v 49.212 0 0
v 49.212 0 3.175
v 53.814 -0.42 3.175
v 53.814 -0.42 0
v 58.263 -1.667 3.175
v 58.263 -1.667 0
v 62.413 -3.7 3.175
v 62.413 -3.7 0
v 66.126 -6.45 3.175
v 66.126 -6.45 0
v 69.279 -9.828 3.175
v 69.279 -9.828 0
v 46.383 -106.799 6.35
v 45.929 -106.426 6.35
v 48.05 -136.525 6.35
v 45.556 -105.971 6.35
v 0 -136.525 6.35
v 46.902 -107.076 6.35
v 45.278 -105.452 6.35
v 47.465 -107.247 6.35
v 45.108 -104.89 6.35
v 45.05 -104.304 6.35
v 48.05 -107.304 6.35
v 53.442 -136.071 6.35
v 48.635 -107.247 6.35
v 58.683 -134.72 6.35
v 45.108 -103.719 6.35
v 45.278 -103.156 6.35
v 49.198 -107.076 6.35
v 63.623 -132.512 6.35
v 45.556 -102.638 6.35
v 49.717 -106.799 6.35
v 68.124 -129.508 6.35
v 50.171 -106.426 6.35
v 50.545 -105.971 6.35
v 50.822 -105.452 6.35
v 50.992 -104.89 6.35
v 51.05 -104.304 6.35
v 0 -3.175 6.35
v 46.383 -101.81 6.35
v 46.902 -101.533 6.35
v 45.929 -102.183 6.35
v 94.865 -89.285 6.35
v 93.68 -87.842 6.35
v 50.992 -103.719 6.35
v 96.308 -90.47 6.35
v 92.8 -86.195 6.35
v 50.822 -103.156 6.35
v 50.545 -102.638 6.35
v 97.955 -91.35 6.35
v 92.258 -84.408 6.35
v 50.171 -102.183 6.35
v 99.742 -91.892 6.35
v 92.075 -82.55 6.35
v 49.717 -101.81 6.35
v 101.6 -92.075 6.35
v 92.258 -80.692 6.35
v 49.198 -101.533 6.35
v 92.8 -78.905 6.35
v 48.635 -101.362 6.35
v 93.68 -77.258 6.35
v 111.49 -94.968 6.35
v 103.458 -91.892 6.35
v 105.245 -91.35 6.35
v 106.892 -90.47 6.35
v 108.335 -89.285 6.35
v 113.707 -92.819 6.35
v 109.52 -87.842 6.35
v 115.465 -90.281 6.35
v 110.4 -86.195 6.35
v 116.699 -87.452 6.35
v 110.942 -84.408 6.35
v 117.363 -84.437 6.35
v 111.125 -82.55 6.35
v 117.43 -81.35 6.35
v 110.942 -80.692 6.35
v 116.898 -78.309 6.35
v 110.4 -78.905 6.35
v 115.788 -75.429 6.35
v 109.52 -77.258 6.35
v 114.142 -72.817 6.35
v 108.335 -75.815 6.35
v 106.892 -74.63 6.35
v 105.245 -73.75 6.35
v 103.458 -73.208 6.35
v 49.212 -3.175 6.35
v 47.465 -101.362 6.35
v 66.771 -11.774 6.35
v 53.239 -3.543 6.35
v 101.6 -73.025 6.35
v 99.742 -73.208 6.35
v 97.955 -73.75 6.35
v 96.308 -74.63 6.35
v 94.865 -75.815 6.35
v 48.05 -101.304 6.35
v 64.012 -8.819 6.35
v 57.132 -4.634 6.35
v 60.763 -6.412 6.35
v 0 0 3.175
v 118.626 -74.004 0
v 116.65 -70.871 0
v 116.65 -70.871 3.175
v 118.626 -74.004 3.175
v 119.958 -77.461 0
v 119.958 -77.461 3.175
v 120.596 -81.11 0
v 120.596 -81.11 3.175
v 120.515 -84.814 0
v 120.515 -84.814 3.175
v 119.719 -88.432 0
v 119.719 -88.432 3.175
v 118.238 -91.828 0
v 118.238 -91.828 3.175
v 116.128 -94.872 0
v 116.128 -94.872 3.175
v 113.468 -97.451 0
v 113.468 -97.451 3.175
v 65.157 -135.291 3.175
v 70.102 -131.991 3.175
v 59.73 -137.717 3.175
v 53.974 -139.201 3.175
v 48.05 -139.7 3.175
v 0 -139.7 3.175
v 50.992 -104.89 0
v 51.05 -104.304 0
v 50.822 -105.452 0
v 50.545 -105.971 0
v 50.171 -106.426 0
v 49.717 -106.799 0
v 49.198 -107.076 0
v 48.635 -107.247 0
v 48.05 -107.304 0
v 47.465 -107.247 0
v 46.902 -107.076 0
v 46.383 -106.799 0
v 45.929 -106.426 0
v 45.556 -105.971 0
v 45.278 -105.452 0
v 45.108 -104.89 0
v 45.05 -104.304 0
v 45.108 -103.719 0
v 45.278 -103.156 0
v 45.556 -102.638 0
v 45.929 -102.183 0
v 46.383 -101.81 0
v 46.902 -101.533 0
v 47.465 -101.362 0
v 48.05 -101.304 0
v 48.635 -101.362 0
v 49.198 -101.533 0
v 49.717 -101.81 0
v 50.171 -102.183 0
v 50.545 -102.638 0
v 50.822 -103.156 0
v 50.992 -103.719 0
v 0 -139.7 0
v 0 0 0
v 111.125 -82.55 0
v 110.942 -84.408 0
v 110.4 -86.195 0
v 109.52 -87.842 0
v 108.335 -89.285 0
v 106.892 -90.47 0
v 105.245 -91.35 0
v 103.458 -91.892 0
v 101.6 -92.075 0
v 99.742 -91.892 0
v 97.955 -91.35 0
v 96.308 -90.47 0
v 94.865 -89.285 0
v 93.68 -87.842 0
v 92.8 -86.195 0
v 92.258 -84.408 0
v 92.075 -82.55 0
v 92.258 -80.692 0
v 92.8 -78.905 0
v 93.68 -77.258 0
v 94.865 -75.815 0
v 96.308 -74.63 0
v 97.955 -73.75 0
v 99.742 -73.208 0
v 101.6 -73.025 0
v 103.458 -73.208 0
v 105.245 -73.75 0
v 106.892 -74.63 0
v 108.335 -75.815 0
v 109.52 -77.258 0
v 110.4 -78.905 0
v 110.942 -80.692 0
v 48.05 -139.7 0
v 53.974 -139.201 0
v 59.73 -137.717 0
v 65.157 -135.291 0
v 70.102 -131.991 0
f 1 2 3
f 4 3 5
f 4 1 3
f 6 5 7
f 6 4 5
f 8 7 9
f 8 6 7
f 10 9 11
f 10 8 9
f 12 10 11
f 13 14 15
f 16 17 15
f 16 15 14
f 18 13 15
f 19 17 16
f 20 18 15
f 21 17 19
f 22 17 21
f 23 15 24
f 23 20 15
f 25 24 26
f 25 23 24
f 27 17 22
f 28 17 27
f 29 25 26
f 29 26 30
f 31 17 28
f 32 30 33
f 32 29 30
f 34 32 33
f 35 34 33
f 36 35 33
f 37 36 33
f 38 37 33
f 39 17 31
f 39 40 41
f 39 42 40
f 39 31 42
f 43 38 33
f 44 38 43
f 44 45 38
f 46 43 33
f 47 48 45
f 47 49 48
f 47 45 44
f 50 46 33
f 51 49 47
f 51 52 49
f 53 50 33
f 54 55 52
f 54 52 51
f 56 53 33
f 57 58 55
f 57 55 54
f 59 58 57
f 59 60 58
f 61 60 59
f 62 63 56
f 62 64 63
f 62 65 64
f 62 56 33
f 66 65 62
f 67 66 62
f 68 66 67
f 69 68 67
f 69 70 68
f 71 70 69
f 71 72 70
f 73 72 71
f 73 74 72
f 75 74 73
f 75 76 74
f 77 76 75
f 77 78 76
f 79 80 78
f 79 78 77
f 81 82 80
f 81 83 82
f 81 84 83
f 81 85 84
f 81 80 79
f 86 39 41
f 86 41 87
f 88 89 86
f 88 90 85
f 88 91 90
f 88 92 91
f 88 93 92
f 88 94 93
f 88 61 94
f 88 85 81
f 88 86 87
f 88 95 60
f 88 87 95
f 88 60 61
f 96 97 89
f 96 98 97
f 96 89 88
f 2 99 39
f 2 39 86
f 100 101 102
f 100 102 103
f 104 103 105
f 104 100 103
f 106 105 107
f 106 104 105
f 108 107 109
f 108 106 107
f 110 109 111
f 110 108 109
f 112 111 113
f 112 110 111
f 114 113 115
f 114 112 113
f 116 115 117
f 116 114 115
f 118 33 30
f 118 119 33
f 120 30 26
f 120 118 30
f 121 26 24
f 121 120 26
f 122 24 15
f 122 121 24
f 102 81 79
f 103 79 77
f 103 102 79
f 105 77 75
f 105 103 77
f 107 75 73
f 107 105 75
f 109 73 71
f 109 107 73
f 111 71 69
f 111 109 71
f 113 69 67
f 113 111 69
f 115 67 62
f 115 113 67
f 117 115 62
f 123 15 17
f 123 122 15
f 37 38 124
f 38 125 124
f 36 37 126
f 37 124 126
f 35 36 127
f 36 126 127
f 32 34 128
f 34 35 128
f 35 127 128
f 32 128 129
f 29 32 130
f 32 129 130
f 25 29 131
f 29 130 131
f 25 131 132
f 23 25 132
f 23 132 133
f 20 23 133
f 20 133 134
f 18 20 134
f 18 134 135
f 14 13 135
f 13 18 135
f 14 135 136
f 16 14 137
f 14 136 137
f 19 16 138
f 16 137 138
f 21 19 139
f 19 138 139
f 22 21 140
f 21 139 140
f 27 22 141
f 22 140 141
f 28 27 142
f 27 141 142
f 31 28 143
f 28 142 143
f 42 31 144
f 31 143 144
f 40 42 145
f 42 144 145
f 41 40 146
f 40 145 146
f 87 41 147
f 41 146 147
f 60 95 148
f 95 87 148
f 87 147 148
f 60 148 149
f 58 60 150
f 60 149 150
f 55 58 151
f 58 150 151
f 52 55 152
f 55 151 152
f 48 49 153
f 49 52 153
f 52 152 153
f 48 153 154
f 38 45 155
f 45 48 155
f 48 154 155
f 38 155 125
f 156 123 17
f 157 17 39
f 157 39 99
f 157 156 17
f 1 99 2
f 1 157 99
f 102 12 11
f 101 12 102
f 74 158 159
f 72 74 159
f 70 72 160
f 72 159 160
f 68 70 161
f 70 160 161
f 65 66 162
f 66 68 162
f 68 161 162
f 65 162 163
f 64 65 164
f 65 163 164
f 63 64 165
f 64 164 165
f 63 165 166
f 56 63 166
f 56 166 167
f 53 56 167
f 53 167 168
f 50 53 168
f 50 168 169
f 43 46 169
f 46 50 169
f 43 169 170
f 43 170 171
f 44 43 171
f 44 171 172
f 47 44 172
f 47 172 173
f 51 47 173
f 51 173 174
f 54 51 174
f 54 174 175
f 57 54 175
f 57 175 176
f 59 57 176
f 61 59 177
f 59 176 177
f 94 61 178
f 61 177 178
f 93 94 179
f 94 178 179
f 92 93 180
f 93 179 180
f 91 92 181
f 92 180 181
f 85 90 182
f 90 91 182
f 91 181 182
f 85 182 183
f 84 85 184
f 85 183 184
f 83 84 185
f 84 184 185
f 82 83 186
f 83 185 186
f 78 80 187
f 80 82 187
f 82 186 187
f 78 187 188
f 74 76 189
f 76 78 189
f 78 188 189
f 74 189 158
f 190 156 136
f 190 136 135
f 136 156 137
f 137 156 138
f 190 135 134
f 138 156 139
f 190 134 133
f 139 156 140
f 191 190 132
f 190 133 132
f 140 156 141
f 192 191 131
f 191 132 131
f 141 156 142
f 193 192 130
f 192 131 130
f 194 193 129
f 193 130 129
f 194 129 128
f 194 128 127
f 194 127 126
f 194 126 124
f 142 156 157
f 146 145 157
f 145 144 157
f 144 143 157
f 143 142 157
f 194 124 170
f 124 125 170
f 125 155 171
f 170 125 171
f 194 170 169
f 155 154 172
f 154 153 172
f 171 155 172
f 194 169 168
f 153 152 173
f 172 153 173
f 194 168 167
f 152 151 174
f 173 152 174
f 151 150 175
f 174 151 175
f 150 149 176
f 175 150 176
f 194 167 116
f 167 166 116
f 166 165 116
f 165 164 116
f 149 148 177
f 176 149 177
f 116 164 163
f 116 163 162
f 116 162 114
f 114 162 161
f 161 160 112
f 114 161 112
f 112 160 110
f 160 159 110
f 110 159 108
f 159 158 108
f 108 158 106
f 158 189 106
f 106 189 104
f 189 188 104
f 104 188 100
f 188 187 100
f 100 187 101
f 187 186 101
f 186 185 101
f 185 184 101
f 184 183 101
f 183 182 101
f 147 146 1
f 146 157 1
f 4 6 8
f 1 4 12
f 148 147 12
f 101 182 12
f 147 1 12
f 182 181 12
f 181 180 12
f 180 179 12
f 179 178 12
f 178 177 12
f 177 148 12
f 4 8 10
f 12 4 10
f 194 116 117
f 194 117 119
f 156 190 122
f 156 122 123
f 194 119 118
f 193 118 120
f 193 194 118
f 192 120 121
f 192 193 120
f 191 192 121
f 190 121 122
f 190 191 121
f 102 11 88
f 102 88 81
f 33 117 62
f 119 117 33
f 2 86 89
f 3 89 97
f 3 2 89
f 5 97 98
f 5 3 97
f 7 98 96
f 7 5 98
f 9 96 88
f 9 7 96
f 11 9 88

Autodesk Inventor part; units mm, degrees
ref_plane "YZ Plane" through (0, 0, 0) normal (1, 0, 0) x (0, 1, 0)
ref_plane "XZ Plane" through (0, 0, 0) normal (0, 1, 0) x (-1, 0, 0)
ref_plane "XY Plane" through (0, 0, 0) normal (0, 0, 1) x (1, 0, 0)
sketch "Sketch1" plane through (0, 0, 0) normal (0, 0, 1) x (1, 0, 0)
  line L0 (0, 0) -> (49.2125, 0)
  arc A0 (69.2791, -9.8278) -> (49.2125, 0) centre (49.2125, -25.4) ccw
  line L1 (69.2791, -9.8278) -> (116.6499, -70.8709)
  arc A1 (113.4684, -97.4512) -> (116.6499, -70.8709) centre (101.6, -82.55) ccw
  line L2 (113.4684, -97.4512) -> (70.102, -131.9913)
  arc A2 (48.0501, -139.7) -> (70.102, -131.9913) centre (48.0501, -104.3043) ccw
  line L3 (48.0501, -139.7) -> (0, -139.7)
  line L4 (0, -139.7) -> (0, 0)
  line L5 (0, -139.7) -> (12.7, -139.7) construction
  circle A3 centre (101.6, -82.55) radius 16 construction
  circle A4 centre (48.0501, -104.3043) radius 7.025 construction
  arc A5 (33.057, -35.4) -> (32.0953, -33.6463) centre (49.2125, -25.4) ccw construction
  circle A6 centre (38.1, -63.5) radius 17.907 construction
  circle A7 centre (71.7198, -40.8503) radius 7.025 construction
  circle A8 centre (38.1, -63.5) radius 19.05
  circle A9 centre (48.0501, -104.3043) radius 3
  circle A10 centre (101.6, -82.55) radius 9.525
  dimension "d0" = 19.05
  dimension "d1" = 38.1
  dimension "d4" = 6
  dimension "d5" = 19.05
extrude "Extrusion1" add sketch "Sketch1" along normal blind 6.35 contours L0 A0 L1 A1 L2 A2 L3 L4 | A8
chamfer "Chamfer1" distance 3.175 angle 45 7 edges at (92.9645, -40.3494, 6.35) (60.3845, -2.5889, 6.35) (24.6062, 0, 6.35) (120.515, -84.8141, 6.35) (91.7852, -114.7212, 6.35) (59.7304, -137.7173, 6.35) (24.0251, -139.7, 6.35)
properties part number "baseOuter" material "Aluminum 6061"
